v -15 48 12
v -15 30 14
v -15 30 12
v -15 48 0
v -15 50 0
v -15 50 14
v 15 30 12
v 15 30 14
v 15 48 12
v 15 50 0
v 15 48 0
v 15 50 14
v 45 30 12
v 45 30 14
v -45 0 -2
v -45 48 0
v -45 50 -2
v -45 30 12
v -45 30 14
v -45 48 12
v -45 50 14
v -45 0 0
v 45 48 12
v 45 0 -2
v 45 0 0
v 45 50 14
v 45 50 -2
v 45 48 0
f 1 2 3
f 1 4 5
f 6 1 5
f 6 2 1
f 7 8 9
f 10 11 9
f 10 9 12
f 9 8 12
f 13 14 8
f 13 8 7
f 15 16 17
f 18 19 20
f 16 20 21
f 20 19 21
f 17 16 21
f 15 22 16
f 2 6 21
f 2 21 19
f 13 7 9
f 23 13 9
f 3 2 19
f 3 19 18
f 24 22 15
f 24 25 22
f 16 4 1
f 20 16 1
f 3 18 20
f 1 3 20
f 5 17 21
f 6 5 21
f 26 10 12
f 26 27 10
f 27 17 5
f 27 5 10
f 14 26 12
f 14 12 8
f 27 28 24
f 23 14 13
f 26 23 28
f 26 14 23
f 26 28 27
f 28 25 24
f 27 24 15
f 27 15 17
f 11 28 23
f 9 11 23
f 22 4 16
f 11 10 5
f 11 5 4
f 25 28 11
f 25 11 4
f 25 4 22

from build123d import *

# Parameters (mm, degrees)
F0_W     = 2
F0_H     = 12
F1_DEPTH = 45
F2_W     = 30
F2_H     = 20
F3_DEPTH = 14


with BuildPart() as f1:
    # F0 (on Right) → F1 (new body, symmetric)
    with BuildSketch(Plane.YZ):
        Polygon((48, 0), (0, 0), (0, -2), (50, -2), (50, 0), align=None)
        with Locations((49, 6)):
            Rectangle(F0_W, F0_H)
        Polygon((30, 12), (48, 12), (50, 12), (50, 14), (30, 14), align=None)
    extrude(amount=F1_DEPTH, both=True)

    # F2 (on face) → F3 (cut)
    with BuildSketch(Plane.XY.offset(14)):
        with Locations((0, 40)):
            Rectangle(F2_W, F2_H)
    extrude(amount=-F3_DEPTH, mode=Mode.SUBTRACT)


solid = f1.part
